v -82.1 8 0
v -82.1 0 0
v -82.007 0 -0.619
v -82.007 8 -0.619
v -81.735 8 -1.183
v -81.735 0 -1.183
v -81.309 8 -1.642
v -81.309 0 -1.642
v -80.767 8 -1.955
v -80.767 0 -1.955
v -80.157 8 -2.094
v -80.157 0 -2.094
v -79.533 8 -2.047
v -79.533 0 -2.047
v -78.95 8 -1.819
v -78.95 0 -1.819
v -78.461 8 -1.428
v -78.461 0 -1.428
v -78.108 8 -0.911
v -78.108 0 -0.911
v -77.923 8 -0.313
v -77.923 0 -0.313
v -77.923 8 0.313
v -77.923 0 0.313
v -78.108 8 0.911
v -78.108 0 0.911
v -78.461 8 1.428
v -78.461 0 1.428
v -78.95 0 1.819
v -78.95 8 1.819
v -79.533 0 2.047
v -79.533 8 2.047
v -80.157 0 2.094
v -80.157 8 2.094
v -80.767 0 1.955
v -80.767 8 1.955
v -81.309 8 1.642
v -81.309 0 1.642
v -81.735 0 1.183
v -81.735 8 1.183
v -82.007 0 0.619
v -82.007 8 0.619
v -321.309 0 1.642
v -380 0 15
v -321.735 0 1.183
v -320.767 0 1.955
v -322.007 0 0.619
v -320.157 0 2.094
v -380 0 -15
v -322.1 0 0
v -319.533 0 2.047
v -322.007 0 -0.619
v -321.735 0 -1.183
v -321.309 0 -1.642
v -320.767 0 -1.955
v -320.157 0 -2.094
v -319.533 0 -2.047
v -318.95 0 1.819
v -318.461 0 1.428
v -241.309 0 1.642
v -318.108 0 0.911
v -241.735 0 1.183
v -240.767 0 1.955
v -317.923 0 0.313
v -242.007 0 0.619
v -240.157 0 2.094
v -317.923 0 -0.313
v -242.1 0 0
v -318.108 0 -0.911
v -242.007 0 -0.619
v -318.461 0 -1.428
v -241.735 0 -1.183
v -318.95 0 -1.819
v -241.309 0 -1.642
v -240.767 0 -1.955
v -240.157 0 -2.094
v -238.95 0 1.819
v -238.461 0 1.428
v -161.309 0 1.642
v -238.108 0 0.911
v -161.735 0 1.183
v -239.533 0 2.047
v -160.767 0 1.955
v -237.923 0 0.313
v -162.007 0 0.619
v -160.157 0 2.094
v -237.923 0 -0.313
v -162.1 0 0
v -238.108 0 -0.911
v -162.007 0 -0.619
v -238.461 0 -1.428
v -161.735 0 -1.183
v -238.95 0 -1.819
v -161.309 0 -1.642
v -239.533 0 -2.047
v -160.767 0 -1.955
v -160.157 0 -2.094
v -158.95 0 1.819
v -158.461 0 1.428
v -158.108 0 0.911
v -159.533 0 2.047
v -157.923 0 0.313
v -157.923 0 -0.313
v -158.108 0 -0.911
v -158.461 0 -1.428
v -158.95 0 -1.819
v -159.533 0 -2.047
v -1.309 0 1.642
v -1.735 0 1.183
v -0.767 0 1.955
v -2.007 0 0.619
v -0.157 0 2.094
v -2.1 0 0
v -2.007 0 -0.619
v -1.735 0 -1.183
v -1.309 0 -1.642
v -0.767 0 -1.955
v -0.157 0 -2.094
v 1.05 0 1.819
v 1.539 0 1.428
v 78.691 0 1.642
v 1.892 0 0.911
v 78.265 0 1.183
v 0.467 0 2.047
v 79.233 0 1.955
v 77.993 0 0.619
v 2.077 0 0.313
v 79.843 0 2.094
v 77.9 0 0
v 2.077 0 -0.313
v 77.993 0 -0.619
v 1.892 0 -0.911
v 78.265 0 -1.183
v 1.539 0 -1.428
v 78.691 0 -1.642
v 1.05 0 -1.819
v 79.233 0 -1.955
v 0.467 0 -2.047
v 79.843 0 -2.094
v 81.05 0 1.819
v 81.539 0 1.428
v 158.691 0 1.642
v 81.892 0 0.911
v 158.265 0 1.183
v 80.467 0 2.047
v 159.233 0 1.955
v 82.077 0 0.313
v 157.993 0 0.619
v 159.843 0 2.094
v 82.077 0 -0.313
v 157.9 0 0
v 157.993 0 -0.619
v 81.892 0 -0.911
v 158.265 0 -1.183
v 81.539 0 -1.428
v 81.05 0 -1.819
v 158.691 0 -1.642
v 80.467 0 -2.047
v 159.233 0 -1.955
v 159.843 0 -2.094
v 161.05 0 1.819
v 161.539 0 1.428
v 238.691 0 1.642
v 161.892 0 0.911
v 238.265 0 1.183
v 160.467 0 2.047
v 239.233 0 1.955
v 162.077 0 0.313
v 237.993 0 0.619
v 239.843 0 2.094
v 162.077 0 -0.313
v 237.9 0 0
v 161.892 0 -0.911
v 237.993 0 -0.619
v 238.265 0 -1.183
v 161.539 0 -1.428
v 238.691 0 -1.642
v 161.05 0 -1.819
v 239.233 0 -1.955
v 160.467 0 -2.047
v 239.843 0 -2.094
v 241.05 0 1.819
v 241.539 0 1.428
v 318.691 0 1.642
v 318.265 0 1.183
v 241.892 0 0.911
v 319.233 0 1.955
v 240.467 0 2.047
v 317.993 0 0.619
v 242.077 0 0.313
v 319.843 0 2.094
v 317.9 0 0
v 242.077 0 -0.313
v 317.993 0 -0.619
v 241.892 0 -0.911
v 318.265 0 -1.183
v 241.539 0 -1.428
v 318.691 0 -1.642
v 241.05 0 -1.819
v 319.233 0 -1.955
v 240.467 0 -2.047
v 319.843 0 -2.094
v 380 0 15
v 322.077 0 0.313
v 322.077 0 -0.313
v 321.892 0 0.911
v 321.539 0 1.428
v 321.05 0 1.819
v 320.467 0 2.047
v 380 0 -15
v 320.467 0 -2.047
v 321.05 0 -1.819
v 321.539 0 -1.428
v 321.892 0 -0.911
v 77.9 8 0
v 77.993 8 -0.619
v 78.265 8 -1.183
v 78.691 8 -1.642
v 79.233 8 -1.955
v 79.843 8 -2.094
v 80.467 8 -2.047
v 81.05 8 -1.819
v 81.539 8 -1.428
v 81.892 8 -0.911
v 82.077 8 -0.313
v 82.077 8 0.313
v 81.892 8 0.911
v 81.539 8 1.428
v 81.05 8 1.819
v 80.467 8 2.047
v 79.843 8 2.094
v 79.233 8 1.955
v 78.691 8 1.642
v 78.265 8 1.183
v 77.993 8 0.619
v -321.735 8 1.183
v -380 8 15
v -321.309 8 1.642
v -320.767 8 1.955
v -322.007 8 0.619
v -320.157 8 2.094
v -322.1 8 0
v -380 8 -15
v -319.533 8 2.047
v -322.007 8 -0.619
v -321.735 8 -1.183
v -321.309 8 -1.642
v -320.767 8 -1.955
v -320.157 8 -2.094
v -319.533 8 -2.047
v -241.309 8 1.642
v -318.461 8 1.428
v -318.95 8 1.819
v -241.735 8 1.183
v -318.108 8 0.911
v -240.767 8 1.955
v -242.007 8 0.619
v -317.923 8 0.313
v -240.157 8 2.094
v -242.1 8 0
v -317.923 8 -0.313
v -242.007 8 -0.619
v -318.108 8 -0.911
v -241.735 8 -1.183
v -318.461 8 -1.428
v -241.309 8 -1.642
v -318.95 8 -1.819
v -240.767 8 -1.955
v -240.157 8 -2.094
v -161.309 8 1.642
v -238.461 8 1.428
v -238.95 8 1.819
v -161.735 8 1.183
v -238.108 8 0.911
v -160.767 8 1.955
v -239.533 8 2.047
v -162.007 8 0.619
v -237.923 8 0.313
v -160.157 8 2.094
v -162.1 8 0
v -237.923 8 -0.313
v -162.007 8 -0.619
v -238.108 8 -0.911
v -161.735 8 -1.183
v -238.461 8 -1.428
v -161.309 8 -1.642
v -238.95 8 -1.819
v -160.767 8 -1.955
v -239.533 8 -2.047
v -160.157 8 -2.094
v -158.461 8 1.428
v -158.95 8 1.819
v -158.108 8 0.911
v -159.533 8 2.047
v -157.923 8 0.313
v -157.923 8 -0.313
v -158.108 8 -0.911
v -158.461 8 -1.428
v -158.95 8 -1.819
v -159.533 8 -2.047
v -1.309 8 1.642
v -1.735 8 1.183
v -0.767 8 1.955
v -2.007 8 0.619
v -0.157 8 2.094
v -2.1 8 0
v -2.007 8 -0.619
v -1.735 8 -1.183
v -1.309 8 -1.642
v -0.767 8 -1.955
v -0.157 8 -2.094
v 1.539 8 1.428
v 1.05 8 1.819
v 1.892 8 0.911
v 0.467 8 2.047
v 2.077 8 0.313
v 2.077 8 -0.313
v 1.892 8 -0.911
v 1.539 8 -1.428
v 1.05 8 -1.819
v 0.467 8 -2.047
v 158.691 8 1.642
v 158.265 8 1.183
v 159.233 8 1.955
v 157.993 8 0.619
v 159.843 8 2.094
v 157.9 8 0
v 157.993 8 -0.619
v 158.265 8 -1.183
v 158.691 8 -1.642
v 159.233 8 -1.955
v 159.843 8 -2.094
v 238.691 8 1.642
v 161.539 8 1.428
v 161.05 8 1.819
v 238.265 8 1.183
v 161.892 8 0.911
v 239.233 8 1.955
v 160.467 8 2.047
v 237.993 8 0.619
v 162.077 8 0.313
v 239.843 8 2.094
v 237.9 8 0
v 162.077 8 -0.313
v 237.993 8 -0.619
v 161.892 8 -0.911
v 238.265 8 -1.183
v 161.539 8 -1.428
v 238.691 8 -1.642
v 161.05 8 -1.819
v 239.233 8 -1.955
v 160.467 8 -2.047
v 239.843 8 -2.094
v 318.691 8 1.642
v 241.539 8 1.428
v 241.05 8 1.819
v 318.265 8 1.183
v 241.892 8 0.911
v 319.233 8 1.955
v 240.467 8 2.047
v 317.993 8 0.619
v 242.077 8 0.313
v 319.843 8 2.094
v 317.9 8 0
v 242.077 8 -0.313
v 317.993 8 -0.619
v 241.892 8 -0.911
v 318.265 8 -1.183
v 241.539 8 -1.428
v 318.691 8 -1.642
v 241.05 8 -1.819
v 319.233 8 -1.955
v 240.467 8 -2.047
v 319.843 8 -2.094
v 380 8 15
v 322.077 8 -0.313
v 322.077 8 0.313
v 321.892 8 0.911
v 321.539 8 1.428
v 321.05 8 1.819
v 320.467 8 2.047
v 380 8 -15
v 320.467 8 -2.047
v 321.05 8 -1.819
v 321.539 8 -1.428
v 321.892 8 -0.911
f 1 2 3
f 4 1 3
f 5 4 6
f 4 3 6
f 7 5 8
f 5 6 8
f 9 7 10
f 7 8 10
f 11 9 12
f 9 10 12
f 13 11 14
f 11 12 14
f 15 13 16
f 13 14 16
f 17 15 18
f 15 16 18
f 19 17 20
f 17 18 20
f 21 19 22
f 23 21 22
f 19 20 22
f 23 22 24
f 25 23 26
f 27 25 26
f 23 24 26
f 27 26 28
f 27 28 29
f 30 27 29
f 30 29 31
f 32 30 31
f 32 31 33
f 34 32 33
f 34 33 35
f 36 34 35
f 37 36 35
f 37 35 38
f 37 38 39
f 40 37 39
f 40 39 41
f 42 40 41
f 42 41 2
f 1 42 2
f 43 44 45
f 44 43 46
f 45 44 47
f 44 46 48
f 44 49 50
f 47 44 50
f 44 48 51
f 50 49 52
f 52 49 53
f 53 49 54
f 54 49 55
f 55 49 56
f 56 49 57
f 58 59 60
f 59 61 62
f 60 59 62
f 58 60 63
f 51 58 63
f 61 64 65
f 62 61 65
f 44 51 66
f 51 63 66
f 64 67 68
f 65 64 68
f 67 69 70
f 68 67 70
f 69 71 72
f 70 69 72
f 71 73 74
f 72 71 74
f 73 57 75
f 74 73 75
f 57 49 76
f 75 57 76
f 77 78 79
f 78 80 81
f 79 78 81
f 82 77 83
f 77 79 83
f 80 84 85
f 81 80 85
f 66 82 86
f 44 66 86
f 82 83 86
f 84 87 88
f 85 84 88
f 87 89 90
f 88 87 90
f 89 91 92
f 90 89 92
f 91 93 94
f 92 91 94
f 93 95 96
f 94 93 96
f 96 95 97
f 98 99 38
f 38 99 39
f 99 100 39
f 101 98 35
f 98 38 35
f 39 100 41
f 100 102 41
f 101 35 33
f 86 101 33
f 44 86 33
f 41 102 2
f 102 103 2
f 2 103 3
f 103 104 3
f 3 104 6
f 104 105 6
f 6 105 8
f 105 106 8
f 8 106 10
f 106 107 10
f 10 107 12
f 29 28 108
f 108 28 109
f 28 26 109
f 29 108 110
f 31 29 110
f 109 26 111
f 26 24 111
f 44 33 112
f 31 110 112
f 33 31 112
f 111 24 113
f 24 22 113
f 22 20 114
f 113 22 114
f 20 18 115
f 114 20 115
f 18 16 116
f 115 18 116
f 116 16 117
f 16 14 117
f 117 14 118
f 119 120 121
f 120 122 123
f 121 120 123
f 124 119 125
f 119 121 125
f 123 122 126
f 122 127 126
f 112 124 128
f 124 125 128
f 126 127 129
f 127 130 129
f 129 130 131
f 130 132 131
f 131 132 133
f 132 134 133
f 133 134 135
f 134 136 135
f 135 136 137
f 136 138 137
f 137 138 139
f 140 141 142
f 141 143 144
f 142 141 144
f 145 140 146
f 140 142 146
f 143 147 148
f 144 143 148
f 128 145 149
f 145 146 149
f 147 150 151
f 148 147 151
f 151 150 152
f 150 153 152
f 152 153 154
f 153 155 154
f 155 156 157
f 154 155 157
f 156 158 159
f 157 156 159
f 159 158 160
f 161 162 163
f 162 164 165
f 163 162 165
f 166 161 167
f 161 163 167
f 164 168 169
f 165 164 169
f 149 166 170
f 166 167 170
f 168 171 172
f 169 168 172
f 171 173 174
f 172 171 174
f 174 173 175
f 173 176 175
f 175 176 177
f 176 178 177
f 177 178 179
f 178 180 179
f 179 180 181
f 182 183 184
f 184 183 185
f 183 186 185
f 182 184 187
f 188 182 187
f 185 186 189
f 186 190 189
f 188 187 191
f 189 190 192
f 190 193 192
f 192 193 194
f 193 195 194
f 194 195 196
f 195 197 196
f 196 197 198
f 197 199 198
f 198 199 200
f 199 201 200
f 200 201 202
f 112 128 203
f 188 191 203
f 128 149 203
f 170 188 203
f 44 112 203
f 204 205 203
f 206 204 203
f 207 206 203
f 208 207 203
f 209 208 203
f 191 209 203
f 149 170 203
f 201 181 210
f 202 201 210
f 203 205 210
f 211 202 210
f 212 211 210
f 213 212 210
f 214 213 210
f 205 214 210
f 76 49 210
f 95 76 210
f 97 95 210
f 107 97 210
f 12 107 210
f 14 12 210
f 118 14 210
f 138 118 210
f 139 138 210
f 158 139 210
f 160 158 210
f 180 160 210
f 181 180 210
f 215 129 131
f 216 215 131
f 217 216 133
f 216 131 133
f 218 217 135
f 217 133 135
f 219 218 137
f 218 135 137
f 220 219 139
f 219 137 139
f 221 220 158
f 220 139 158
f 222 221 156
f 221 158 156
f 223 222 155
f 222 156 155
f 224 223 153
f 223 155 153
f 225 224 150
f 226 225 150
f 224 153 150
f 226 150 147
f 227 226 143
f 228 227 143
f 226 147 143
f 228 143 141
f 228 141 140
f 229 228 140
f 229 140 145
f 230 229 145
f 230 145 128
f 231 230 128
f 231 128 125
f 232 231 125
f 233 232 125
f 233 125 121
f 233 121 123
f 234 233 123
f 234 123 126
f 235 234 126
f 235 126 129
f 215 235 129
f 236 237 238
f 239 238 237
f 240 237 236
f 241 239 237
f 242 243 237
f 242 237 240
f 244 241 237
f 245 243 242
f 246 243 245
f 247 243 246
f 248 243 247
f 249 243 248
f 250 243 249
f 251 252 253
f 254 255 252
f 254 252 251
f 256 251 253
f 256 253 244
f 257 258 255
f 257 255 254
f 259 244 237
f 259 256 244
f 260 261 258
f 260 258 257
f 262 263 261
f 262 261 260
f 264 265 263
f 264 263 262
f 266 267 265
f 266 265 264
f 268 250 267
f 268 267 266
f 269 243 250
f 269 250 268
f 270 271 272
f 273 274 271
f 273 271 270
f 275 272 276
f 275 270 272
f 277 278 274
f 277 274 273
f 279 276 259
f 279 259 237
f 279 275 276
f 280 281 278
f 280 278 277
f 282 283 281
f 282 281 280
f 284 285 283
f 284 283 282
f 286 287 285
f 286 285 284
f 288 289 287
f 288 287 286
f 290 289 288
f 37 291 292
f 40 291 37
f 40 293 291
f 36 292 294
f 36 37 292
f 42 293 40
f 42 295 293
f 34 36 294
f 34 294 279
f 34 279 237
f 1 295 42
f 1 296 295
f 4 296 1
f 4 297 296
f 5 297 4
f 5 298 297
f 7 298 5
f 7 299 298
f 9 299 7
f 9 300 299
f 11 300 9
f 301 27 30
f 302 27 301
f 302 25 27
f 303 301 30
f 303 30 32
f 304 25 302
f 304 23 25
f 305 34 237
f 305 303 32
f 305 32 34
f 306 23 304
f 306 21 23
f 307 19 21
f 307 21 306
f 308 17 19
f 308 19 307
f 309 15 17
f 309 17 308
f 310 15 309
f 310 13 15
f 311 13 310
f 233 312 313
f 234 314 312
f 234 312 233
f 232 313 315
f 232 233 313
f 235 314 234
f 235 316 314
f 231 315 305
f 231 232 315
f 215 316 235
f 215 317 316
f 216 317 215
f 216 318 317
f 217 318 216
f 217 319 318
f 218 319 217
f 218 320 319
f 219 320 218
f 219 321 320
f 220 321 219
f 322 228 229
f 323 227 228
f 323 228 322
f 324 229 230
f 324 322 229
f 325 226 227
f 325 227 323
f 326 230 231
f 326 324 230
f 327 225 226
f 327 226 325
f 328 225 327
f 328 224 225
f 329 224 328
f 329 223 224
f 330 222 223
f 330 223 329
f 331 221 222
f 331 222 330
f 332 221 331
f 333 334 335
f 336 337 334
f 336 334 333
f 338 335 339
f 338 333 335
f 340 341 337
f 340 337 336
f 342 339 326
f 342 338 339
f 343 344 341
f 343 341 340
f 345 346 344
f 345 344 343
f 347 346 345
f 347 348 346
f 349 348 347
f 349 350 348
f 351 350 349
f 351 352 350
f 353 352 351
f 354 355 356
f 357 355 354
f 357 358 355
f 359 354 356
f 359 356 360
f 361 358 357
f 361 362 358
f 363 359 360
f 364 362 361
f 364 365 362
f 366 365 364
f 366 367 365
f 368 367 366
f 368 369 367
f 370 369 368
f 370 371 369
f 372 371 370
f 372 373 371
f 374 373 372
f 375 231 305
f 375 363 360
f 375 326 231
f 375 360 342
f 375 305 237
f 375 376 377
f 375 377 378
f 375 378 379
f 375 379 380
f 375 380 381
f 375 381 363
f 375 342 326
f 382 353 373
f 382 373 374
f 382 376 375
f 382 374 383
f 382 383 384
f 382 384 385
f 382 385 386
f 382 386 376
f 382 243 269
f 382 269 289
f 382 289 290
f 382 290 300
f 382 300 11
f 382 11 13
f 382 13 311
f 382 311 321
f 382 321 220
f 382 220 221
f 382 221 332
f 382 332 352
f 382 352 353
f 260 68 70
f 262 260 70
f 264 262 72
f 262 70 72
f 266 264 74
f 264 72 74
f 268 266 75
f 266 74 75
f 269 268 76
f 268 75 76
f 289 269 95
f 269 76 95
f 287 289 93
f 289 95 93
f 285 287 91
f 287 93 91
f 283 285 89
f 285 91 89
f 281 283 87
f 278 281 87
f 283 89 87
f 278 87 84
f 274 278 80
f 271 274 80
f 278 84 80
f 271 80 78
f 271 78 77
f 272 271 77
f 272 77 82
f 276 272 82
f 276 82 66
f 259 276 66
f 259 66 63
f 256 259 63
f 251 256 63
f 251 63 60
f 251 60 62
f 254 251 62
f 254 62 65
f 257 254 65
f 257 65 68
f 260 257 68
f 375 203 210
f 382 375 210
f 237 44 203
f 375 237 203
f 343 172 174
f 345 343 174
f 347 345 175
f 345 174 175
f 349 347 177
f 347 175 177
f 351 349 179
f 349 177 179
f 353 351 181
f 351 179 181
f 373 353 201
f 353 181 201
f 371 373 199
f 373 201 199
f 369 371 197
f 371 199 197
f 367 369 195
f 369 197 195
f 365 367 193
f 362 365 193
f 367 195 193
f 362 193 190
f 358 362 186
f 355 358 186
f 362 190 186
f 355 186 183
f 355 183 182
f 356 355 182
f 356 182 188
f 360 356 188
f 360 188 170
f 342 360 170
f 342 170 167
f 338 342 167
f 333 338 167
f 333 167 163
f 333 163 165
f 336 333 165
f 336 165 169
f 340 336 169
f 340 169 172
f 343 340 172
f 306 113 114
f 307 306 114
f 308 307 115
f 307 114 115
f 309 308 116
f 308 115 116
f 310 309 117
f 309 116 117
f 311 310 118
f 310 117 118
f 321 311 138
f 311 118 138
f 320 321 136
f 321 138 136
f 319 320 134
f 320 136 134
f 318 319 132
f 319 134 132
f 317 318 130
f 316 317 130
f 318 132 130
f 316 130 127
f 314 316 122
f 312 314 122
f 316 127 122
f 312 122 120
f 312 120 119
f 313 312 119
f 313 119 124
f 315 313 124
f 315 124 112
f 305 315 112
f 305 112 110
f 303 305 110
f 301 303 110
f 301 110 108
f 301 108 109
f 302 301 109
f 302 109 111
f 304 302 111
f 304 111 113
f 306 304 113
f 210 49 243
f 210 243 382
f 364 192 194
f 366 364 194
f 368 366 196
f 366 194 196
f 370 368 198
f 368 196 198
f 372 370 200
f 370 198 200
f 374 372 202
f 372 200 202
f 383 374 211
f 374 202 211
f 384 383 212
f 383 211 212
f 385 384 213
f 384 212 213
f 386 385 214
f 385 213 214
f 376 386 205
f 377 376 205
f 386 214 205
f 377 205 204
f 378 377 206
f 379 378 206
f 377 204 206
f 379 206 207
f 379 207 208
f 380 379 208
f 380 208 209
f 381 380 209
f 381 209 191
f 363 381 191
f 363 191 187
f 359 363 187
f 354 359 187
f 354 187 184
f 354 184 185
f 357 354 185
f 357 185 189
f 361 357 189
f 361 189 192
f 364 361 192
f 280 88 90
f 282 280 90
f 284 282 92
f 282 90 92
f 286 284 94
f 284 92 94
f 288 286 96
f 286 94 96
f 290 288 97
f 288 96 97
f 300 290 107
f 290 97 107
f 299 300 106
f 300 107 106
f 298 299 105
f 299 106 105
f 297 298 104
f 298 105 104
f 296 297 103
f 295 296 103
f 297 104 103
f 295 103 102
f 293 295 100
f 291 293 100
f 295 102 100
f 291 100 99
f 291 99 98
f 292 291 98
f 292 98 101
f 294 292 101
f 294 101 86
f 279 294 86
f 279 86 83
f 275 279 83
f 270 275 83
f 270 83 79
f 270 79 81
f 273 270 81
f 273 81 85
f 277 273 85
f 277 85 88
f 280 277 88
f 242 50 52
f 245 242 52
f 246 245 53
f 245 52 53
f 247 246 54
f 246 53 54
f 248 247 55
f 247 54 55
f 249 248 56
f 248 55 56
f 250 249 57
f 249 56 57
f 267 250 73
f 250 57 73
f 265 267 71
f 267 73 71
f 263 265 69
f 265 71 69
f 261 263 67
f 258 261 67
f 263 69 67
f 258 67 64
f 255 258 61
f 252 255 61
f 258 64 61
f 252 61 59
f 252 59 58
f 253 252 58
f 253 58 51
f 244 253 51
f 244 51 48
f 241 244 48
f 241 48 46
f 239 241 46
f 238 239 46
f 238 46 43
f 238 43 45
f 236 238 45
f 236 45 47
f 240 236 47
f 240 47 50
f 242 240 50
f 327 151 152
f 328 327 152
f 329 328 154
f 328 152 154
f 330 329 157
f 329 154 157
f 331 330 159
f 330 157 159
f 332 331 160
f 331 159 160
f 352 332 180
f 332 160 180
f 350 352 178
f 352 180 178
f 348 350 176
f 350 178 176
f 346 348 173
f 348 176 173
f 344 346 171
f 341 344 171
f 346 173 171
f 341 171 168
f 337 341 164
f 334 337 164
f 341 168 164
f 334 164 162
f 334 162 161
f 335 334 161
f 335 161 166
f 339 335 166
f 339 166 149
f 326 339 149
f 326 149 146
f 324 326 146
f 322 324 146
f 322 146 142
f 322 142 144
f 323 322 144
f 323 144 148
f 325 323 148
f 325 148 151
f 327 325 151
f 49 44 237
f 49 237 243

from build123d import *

# Parameters (mm, degrees)
SKETCH1_W           = 760
SKETCH1_H           = 30
BOSS_EXTRUDE1_DEPTH = 8
M5_TAPPED_HOLE1_D   = 4.2


with BuildPart() as part:
    # Sketch1 → Boss-Extrude1 (new body)
    with BuildSketch(Plane(origin=(0, 0, 0), x_dir=(1, 0, 0), z_dir=(0, 1, 0))):
        Rectangle(SKETCH1_W, SKETCH1_H)
    extrude(amount=BOSS_EXTRUDE1_DEPTH)

    # M5 Tapped Hole1 (through all)
    with Locations(Plane(origin=(0, 8, 0), x_dir=(1, 0, 0), z_dir=(0, 1, 0))):
        with Locations((0, 0), (80, 0), (160, 0), (240, 0), (320, 0), (-80, 0), (-160, 0), (-240, 0), (-320, 0)):
            Hole(M5_TAPPED_HOLE1_D / 2)


solid = part.part
